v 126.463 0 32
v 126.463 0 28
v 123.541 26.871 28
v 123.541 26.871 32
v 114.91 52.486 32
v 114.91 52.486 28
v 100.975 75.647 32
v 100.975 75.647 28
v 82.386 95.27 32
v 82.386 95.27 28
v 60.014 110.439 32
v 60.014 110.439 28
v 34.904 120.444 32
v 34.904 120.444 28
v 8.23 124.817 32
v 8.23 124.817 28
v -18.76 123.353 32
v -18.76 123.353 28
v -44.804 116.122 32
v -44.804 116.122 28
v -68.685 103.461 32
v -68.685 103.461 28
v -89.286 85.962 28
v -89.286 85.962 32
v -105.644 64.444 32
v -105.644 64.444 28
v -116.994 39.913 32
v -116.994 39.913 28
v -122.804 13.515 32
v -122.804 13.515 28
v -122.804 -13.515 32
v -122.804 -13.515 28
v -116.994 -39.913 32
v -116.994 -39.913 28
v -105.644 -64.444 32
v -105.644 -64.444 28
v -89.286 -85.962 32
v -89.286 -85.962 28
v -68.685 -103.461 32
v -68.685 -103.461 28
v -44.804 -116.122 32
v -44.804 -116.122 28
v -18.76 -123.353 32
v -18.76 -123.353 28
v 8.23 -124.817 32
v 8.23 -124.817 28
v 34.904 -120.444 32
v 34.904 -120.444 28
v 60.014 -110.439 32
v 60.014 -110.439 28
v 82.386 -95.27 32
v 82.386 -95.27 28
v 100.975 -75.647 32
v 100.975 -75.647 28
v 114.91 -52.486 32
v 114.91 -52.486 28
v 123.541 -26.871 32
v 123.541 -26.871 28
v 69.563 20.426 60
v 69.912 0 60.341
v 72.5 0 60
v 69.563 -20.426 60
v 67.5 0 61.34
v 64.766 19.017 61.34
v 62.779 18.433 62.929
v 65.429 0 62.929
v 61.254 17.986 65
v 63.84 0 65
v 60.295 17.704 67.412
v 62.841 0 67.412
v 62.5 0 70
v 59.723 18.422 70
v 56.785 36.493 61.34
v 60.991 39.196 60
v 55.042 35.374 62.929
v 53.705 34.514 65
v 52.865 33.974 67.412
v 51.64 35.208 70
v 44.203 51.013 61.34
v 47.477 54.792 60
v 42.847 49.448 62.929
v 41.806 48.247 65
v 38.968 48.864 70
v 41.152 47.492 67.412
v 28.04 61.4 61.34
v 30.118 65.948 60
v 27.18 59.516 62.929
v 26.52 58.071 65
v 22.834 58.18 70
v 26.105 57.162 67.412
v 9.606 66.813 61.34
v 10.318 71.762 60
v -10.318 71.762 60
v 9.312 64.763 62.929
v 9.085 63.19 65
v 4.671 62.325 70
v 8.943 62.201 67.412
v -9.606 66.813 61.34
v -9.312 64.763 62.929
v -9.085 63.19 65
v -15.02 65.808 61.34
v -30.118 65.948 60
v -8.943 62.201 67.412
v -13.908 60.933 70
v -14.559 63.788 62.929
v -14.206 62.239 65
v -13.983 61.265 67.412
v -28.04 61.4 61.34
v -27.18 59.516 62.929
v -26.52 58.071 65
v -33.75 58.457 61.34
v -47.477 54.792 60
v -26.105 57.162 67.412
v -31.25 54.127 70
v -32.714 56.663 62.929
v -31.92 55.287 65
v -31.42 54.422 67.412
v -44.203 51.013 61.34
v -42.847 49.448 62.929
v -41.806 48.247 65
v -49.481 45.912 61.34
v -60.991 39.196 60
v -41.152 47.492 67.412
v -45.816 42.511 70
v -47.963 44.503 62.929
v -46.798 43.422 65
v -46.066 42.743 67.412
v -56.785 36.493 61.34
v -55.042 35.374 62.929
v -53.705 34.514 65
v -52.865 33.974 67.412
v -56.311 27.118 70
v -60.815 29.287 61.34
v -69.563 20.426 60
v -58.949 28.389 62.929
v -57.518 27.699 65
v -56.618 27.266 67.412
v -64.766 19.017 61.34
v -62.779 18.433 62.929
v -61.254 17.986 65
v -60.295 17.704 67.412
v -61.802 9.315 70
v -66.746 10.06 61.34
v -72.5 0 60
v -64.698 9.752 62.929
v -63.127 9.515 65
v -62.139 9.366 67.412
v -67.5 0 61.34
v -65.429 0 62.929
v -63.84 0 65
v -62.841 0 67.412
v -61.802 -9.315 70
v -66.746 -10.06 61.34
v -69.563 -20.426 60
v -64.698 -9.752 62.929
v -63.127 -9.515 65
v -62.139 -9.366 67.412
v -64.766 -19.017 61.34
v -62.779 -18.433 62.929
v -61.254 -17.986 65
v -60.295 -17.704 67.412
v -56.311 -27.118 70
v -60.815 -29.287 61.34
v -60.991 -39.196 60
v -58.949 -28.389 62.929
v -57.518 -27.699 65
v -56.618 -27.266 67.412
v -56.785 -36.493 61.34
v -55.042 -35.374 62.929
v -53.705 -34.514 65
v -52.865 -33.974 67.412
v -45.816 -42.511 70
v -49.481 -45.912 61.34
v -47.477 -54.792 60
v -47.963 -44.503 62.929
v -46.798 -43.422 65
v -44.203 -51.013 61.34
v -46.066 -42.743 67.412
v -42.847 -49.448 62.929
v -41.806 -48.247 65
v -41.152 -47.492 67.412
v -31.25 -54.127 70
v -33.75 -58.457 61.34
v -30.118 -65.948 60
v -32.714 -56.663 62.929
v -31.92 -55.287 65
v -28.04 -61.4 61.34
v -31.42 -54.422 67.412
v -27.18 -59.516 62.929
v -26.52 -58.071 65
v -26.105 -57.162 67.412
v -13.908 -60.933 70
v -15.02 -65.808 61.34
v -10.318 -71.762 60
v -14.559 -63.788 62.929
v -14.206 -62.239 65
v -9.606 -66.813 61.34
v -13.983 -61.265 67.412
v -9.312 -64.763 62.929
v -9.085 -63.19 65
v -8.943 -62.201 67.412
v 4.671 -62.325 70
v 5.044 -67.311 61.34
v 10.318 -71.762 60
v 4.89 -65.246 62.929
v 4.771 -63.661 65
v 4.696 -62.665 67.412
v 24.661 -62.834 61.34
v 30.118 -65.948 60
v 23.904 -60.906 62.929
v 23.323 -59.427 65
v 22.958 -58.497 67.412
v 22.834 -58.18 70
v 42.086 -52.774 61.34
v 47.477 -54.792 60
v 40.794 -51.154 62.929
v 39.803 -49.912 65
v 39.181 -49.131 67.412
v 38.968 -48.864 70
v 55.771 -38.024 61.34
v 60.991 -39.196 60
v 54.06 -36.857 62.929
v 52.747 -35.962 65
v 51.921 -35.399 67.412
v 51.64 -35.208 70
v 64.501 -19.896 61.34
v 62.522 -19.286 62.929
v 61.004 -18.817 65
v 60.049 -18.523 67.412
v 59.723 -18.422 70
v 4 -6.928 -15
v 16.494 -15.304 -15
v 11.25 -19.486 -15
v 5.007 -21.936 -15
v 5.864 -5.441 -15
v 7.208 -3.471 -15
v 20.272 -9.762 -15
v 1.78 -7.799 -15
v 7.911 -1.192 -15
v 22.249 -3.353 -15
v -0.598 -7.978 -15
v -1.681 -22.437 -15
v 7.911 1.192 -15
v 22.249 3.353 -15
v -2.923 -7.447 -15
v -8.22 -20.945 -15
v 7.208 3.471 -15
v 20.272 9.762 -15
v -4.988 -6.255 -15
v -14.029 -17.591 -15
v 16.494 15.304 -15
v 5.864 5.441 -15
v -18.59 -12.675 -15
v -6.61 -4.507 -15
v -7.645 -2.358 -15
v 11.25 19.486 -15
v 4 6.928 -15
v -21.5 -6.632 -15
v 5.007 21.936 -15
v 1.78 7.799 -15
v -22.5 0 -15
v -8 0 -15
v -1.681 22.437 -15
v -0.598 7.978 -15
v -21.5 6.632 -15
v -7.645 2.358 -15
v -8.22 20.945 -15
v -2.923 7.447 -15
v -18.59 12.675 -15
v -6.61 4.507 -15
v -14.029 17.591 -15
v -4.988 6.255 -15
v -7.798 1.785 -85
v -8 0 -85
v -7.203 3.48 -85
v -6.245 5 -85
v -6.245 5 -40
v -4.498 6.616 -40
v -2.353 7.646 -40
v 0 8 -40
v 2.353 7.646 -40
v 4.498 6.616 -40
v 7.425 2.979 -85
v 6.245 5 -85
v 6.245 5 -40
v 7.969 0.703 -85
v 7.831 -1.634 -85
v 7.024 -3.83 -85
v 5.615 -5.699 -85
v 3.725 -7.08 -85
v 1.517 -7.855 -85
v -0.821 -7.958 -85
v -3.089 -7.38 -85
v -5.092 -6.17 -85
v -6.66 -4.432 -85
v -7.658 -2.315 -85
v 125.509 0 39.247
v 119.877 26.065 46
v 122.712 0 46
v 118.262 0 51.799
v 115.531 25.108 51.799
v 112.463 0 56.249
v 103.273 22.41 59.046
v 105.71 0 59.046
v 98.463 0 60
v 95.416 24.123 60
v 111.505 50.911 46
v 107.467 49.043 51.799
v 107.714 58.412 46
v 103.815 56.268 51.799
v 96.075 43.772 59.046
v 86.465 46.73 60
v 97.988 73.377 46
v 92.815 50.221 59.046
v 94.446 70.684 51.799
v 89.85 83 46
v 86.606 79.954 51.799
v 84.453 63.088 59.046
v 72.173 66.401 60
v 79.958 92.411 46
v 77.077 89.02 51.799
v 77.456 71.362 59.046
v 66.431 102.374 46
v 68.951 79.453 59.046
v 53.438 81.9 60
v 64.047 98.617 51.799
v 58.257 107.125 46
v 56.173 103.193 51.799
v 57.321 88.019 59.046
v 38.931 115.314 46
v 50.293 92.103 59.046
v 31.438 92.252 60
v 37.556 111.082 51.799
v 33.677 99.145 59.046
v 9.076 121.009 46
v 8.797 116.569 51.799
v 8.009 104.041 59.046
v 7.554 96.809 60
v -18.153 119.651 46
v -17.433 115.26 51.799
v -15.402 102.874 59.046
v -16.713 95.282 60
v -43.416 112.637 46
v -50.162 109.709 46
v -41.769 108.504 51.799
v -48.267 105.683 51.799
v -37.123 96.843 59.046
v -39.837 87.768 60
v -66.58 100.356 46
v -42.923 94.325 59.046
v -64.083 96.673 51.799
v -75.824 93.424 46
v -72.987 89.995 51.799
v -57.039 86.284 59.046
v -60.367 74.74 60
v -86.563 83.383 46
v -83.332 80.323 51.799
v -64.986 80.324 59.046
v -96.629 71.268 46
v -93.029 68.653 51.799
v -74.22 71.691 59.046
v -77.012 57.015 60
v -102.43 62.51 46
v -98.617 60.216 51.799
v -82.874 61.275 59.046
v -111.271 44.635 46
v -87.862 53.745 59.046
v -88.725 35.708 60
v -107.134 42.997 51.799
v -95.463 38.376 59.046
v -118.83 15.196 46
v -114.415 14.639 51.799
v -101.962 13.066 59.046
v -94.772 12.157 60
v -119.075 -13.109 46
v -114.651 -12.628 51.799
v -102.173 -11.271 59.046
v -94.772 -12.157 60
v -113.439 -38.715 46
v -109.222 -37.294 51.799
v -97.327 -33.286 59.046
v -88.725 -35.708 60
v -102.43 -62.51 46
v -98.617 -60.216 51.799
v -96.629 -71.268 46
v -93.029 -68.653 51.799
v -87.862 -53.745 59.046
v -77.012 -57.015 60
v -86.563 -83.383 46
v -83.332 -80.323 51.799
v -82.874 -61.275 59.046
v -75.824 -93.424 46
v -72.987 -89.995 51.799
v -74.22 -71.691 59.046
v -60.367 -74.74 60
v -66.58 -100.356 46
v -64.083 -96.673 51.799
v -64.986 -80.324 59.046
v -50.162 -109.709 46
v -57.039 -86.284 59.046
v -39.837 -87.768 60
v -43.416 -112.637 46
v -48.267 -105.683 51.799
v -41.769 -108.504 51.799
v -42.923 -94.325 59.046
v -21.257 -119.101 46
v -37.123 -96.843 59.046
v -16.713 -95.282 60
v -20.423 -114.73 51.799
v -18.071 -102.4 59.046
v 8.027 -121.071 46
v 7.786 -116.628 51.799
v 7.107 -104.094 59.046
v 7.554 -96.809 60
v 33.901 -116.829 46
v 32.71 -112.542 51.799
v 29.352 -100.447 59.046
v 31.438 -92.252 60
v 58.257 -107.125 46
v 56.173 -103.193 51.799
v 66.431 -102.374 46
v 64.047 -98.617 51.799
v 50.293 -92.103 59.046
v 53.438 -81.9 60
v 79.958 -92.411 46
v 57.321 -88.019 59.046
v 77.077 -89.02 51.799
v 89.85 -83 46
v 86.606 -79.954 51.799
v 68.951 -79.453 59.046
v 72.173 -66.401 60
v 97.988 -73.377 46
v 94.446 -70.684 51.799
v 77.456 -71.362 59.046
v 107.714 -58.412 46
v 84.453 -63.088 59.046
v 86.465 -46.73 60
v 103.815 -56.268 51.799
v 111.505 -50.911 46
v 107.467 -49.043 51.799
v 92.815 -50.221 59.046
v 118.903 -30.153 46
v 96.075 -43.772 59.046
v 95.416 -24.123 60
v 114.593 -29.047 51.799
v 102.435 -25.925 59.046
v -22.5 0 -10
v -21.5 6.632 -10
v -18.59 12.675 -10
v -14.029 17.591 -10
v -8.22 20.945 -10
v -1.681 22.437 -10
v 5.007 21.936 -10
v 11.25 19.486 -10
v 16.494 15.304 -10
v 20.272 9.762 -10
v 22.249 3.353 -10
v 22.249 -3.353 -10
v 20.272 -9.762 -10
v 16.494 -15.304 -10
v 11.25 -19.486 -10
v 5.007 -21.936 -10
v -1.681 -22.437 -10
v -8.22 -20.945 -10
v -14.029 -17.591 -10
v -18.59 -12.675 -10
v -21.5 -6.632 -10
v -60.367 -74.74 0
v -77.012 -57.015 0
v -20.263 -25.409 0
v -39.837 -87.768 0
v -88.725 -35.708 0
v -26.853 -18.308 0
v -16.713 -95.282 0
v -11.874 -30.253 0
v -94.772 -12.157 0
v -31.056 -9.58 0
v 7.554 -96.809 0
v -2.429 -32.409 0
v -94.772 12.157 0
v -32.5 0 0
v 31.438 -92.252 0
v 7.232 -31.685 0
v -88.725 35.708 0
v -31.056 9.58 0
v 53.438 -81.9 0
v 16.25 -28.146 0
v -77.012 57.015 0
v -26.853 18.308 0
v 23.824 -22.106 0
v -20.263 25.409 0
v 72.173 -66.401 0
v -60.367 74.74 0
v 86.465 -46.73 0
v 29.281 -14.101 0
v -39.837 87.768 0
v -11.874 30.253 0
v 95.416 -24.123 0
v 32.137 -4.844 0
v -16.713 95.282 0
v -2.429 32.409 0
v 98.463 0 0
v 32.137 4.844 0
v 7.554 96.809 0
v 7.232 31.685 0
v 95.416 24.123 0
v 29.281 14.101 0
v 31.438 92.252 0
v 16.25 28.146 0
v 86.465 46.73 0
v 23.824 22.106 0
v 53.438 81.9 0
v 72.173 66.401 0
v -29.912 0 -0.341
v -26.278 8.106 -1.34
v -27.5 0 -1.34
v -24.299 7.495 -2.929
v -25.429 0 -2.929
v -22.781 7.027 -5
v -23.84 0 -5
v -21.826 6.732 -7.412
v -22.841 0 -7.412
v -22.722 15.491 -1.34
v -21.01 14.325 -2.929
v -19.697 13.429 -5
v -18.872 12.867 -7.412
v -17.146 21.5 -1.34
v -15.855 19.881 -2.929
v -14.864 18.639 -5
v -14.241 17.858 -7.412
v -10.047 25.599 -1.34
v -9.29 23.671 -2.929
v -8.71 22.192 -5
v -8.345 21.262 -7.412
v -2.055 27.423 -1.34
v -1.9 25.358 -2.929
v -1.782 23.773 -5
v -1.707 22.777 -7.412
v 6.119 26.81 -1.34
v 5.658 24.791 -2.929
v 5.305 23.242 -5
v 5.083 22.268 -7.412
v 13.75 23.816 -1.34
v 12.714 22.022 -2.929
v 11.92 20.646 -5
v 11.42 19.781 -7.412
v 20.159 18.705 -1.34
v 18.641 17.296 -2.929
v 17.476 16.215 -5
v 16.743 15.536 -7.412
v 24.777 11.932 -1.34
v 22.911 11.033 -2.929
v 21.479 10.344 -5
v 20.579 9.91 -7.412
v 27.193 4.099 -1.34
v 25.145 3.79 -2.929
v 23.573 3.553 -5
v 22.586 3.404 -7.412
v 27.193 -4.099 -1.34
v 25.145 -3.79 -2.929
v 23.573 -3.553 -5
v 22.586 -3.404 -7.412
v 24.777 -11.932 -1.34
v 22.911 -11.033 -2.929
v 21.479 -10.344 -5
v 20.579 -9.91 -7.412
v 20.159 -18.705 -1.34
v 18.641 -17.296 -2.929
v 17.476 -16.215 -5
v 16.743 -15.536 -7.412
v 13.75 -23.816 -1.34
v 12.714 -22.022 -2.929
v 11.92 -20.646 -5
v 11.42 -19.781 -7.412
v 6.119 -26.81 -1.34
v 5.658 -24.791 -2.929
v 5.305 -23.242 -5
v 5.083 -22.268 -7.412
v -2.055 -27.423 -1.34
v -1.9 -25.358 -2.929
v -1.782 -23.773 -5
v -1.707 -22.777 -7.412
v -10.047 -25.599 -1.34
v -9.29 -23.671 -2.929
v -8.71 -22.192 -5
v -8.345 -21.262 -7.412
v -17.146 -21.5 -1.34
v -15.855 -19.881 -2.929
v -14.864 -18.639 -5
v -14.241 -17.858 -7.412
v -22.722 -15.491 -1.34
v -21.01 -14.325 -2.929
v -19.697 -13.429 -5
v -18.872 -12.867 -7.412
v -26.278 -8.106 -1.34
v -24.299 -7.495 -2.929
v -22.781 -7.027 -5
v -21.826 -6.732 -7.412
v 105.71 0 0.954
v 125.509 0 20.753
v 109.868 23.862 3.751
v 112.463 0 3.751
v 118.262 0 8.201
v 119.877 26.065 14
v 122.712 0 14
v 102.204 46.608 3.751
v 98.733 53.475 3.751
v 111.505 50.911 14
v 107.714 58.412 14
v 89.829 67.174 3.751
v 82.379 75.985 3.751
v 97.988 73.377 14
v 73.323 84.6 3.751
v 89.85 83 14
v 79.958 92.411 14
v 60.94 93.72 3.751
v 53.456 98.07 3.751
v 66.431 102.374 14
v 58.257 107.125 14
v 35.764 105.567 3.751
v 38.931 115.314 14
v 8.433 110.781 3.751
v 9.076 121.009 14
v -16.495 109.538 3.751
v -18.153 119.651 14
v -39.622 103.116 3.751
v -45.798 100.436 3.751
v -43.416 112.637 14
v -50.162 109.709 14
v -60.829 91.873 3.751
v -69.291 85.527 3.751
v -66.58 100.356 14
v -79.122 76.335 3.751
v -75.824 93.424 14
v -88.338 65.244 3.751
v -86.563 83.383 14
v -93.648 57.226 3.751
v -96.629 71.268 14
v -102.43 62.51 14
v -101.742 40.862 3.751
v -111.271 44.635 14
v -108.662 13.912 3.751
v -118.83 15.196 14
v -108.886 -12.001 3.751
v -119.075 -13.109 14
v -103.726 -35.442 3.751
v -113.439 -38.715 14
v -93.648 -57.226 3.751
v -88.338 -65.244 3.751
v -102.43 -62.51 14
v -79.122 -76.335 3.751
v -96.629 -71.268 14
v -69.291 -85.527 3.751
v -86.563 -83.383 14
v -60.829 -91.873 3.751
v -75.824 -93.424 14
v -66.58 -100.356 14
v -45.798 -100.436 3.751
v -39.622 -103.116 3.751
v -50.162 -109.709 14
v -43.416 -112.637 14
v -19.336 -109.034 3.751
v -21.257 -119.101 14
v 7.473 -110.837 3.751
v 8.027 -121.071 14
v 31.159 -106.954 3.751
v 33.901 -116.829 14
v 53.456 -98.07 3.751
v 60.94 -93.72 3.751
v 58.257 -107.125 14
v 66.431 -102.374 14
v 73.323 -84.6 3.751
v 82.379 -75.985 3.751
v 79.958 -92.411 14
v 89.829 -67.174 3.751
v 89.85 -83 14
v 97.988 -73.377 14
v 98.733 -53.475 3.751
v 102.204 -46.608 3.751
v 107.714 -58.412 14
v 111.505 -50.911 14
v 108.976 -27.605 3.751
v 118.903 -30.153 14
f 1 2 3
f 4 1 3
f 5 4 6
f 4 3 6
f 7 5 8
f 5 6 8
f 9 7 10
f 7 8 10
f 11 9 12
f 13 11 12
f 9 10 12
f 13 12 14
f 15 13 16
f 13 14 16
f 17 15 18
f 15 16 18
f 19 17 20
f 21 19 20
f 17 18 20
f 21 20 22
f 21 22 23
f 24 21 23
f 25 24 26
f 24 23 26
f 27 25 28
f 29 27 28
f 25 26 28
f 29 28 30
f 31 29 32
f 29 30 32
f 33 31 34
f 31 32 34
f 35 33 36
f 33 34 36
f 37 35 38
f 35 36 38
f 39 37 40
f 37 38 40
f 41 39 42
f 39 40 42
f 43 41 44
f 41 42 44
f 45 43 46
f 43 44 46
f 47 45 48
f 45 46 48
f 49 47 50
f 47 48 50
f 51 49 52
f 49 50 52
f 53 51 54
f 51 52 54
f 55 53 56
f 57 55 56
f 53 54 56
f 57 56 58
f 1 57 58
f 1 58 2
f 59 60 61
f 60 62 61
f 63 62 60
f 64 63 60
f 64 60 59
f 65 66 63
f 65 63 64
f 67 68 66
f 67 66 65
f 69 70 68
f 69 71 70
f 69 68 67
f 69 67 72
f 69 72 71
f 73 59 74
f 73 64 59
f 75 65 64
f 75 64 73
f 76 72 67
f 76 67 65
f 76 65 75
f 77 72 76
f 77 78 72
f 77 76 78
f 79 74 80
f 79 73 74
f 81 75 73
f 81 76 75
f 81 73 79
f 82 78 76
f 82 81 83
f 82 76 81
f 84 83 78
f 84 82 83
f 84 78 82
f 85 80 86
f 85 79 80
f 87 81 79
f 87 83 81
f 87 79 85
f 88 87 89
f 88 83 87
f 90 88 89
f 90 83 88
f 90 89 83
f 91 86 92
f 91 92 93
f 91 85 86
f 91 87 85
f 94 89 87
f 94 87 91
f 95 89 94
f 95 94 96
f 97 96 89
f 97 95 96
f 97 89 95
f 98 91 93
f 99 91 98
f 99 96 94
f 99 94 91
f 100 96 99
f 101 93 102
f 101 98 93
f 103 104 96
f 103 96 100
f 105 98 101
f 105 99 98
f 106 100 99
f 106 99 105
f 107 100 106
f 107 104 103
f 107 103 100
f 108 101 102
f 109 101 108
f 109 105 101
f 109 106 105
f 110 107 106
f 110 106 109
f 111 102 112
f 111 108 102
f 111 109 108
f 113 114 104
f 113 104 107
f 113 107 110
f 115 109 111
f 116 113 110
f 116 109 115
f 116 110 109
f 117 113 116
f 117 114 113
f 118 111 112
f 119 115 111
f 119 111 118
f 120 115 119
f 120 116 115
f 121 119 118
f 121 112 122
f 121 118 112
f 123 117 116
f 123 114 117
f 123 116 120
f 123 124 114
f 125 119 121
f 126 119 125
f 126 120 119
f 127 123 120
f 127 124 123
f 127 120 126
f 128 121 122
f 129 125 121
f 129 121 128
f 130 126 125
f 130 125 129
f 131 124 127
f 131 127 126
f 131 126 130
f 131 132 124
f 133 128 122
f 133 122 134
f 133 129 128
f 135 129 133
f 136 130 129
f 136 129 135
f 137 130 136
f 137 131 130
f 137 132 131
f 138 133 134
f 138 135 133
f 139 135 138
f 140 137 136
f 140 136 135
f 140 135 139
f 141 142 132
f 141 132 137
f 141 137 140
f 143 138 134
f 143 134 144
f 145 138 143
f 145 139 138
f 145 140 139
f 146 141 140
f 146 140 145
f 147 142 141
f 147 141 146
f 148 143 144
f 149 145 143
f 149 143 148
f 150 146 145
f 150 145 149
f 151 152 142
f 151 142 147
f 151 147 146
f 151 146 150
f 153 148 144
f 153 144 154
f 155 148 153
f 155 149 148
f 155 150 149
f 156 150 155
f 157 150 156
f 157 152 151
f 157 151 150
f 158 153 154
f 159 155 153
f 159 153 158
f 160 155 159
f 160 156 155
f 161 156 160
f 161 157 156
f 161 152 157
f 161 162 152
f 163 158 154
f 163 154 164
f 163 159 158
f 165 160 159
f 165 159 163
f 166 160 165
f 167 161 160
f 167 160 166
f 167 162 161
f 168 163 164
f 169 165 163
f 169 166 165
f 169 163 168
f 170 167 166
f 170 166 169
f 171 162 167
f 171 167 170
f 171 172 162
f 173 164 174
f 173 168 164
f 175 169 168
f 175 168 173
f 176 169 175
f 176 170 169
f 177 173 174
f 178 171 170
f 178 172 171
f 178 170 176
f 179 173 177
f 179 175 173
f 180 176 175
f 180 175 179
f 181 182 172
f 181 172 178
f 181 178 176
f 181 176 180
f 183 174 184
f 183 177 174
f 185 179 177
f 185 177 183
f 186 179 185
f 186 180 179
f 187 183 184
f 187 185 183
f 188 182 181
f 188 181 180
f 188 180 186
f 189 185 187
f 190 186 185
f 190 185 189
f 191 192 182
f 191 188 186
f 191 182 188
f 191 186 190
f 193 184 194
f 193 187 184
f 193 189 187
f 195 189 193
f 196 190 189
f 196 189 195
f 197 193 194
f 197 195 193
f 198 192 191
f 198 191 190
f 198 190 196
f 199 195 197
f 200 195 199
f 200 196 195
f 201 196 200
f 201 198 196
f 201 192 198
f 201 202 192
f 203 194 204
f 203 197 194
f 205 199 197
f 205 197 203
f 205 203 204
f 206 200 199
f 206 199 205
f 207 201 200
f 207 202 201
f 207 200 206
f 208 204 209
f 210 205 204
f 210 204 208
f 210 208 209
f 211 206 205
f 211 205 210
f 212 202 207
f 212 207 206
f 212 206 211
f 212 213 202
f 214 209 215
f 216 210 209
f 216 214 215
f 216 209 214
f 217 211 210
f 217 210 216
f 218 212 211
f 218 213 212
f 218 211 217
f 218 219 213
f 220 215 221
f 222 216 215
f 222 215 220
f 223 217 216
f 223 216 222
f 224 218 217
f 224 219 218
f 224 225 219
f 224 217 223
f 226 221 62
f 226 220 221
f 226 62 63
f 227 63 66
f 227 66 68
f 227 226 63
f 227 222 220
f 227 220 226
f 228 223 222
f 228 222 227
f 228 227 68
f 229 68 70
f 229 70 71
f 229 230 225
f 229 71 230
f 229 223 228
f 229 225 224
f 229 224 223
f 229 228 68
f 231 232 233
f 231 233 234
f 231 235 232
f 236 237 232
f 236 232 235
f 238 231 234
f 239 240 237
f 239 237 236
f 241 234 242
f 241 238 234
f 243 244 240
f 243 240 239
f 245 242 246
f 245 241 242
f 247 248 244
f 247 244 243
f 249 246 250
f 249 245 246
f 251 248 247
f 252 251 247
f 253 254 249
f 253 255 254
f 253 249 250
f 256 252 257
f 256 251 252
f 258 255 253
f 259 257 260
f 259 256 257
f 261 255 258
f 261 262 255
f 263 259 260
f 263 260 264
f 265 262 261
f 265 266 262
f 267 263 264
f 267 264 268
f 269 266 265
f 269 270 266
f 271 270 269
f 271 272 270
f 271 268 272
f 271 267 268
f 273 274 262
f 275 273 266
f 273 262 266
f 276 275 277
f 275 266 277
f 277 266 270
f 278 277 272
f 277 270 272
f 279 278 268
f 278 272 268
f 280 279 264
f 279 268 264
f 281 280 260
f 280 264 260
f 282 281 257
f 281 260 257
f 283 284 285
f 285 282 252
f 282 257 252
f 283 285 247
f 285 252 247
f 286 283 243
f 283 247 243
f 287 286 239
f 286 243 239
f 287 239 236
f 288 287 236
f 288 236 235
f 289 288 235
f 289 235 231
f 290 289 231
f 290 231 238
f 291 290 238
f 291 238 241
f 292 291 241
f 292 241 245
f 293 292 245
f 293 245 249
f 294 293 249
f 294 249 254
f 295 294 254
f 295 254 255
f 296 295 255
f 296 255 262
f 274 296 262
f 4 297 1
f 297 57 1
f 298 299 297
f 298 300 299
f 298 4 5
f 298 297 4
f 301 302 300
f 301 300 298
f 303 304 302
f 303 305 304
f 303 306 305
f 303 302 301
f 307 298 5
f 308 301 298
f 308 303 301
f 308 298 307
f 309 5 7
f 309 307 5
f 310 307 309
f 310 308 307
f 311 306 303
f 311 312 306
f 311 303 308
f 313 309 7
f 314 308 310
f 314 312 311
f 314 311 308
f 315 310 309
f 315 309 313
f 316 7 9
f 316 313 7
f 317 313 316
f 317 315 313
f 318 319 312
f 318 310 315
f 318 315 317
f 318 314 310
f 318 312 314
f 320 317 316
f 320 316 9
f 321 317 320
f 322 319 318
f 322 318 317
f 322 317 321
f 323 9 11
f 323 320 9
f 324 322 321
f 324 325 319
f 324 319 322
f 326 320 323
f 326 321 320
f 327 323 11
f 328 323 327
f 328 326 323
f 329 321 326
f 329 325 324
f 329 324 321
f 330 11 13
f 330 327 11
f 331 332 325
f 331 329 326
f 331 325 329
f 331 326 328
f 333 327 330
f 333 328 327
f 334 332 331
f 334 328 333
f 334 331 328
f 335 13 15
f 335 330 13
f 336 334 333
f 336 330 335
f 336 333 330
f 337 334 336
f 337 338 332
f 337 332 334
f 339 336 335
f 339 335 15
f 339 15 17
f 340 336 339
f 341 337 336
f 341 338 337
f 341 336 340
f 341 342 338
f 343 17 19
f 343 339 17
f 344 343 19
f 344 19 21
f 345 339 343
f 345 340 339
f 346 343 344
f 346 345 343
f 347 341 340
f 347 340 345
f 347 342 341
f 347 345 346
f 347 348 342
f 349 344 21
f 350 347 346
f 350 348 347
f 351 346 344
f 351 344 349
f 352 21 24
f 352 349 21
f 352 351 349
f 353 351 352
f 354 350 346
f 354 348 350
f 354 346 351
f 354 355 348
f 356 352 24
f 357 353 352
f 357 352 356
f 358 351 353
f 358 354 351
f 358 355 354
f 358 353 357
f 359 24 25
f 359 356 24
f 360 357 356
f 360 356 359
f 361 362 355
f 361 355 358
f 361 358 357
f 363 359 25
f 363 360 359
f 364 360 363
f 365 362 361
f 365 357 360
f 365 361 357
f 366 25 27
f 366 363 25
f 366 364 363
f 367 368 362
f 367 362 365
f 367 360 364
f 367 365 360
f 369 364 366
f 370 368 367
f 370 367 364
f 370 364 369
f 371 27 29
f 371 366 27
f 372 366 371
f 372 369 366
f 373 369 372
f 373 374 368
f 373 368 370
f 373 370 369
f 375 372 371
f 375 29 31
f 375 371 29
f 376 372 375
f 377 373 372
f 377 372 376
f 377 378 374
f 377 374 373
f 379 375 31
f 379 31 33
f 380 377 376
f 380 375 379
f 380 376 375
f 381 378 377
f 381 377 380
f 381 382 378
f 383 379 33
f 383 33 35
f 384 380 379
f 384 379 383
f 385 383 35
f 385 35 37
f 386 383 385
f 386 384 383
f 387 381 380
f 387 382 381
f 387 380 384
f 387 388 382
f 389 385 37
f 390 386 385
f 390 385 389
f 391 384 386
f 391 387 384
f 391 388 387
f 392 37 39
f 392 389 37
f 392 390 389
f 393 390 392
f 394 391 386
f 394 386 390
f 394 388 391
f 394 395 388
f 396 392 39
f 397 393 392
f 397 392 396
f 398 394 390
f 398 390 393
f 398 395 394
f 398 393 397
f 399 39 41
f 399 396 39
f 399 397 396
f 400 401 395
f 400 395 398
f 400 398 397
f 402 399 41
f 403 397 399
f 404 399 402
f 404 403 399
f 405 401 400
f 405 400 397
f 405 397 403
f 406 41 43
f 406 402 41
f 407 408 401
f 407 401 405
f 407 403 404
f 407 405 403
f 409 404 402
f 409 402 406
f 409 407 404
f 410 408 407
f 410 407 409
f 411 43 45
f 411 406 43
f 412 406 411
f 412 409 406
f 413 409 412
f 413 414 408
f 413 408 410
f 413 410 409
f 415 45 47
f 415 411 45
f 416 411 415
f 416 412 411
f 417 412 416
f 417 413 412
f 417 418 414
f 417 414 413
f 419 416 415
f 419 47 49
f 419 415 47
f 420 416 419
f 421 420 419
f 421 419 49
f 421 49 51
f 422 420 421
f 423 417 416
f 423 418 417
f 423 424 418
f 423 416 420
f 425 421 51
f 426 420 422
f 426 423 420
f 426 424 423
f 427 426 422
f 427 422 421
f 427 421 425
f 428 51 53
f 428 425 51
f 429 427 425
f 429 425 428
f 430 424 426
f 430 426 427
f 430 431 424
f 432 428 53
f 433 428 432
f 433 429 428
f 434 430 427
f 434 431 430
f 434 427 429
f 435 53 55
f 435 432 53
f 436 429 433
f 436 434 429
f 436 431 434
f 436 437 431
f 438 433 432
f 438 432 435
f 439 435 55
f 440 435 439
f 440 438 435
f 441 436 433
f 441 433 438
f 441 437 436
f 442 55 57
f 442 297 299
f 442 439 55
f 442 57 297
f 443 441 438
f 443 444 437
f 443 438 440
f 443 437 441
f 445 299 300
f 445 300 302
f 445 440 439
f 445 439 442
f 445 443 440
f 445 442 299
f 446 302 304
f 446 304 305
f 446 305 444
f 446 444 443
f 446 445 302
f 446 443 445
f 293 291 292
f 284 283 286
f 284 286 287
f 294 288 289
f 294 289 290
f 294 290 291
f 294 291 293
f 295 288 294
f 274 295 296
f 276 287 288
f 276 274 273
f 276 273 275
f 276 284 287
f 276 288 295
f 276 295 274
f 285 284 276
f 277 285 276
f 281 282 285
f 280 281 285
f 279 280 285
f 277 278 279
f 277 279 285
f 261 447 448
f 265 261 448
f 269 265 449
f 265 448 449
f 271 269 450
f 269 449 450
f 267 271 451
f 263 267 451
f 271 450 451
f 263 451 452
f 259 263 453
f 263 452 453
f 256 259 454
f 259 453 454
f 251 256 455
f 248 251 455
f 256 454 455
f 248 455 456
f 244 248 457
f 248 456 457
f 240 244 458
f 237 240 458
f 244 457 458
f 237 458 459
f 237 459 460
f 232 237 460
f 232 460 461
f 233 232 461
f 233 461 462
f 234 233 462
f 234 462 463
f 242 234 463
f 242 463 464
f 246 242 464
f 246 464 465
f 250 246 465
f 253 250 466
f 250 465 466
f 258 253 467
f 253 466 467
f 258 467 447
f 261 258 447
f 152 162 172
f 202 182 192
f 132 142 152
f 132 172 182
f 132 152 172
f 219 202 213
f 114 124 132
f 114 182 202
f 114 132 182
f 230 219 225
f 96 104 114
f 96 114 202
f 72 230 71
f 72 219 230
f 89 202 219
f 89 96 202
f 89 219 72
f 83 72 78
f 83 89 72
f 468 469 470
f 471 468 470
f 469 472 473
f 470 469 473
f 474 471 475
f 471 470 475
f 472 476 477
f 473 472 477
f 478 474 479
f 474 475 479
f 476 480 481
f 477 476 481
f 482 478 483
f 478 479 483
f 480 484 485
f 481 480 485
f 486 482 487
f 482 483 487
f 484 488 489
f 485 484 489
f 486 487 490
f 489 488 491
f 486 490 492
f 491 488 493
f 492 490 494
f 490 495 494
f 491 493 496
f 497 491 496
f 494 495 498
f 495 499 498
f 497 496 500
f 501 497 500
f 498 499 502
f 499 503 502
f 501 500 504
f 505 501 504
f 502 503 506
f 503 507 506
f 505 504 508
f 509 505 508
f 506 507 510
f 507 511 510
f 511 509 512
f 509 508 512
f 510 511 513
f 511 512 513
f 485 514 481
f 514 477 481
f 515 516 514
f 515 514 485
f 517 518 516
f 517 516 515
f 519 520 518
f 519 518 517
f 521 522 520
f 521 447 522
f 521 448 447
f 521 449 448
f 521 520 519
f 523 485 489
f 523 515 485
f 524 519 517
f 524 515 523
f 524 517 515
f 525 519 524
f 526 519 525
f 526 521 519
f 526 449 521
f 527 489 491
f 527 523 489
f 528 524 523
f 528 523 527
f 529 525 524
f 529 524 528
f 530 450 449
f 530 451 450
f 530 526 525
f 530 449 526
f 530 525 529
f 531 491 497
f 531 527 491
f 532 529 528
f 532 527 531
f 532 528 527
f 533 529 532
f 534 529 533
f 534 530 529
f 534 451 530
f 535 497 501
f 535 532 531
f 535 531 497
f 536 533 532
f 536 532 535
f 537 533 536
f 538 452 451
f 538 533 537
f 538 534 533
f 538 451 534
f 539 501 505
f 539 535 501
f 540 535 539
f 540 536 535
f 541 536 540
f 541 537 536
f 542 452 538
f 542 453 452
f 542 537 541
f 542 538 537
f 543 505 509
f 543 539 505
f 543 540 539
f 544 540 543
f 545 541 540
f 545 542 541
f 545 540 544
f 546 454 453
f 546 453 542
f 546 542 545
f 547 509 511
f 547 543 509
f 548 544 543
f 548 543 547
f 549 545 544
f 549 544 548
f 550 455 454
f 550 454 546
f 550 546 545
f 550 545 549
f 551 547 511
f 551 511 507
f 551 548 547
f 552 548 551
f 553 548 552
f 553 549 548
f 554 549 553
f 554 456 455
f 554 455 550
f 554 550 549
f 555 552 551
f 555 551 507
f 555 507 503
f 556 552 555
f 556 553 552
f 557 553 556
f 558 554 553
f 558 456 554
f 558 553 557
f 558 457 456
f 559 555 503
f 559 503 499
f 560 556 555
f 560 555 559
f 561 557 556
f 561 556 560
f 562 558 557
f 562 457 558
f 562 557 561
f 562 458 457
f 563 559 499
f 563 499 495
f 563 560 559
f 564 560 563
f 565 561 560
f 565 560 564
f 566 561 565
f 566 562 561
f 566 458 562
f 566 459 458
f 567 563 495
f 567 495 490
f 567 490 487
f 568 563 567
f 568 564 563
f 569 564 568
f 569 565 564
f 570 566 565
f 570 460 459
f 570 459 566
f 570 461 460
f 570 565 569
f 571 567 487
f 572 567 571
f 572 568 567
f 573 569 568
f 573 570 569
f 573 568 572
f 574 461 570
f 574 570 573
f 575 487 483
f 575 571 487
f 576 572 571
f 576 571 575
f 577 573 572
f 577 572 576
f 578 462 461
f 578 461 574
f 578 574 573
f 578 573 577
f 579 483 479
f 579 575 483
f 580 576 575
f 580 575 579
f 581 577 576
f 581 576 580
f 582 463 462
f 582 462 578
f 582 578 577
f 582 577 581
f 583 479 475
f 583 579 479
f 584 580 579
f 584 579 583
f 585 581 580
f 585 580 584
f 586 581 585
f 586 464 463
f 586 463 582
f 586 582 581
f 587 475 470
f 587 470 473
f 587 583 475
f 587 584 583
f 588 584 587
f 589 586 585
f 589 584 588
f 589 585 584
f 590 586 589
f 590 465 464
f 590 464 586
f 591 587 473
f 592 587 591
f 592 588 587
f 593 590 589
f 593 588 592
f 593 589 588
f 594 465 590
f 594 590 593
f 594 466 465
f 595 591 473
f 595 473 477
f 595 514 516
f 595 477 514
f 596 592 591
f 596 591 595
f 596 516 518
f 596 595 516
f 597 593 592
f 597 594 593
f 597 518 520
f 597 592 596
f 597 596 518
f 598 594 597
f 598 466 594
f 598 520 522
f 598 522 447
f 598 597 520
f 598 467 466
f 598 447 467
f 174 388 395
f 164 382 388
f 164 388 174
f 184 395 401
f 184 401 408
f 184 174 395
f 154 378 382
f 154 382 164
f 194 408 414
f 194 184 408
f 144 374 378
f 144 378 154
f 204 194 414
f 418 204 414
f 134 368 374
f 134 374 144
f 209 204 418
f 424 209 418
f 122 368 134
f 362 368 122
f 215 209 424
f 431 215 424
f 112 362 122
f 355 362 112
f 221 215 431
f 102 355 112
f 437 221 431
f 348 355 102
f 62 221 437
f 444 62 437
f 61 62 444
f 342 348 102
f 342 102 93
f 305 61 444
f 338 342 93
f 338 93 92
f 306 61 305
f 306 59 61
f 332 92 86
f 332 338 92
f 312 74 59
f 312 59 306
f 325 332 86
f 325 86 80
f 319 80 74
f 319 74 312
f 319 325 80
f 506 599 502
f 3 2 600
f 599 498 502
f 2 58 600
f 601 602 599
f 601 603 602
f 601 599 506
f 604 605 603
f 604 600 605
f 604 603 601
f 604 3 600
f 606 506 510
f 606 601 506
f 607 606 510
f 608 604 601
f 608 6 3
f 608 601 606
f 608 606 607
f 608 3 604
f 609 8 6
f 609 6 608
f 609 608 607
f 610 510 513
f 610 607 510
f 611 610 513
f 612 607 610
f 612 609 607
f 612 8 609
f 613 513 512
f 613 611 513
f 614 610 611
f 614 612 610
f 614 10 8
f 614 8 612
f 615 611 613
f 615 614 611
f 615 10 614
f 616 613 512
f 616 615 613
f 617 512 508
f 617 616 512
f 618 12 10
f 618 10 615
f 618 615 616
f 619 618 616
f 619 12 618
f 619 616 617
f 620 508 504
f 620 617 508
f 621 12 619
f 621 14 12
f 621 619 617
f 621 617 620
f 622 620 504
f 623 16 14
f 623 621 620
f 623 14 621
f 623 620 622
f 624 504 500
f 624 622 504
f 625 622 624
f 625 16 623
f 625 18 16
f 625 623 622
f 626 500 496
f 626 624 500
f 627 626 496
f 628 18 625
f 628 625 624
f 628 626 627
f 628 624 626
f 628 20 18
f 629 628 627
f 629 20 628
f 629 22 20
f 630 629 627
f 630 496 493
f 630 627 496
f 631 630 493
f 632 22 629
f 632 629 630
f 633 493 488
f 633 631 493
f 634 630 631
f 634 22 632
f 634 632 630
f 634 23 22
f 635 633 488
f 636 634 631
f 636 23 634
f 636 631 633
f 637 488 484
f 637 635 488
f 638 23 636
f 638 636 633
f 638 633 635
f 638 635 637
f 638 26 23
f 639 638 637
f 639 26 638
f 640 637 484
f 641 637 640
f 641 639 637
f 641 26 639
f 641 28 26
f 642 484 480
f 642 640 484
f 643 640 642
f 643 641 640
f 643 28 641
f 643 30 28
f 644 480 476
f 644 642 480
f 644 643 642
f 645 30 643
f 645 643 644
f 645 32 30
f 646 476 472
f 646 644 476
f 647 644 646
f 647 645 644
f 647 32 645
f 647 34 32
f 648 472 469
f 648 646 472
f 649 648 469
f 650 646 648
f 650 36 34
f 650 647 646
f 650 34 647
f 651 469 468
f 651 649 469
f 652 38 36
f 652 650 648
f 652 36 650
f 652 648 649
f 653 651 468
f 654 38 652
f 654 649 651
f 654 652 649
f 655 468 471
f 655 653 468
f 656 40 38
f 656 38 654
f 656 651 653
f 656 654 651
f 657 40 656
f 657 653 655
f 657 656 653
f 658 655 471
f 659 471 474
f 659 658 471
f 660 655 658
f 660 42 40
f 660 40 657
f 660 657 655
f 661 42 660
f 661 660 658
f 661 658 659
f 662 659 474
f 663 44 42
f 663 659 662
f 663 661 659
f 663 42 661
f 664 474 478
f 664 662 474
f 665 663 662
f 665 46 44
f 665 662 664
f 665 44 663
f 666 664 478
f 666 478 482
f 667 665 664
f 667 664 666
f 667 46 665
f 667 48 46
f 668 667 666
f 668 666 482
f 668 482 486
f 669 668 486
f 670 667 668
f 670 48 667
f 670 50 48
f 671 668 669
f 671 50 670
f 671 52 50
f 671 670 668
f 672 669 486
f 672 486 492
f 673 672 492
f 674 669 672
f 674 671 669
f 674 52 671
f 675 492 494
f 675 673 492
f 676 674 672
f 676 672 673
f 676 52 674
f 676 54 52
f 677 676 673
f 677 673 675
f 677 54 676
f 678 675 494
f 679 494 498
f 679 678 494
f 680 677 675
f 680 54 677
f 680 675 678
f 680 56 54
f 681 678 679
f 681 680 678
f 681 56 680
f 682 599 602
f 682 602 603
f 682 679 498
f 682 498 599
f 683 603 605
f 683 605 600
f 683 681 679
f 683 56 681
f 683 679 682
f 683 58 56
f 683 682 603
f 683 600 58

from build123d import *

# Parameters (mm, degrees)
SCHIZZO1_R                    = 125
ESTRUSIONE_ESTRUSIONE1_DEPTH  = 60
SCHIZZO2_R                    = 62.5
ESTRUSIONE_ESTRUSIONE2_DEPTH  = 10
SCHIZZO3_R                    = 22.5
ESTRUSIONE_ESTRUSIONE3_DEPTH  = 15
SCHIZZO4_R                    = 8
ESTRUSIONE_ESTRUSIONE4_DEPTH  = 70
RACCORDO1_R                   = 10
RACCORDO2_R                   = 28
TAGLIO_ESTRUSIONE1_DEPTH      = 236.887520145
TAGLIO_ESTRUSIONE1_DEPTH_BACK = 45


with BuildPart() as part:
    # Schizzo1 → Estrusione-Estrusione1 (new body)
    with BuildSketch(Plane.XY):
        with Locations((1.463125693, 0)):
            Circle(SCHIZZO1_R)
    extrude(amount=ESTRUSIONE_ESTRUSIONE1_DEPTH)

    # Schizzo2 → Estrusione-Estrusione2 (add)
    with BuildSketch(Plane.XY.offset(60)):
        Circle(SCHIZZO2_R)
    extrude(amount=ESTRUSIONE_ESTRUSIONE2_DEPTH)

    # Schizzo3 → Estrusione-Estrusione3 (add)
    with BuildSketch(Plane(origin=(0, 0, 0), x_dir=(-1, 0, 0), z_dir=(0, 0, -1))):
        Circle(SCHIZZO3_R)
    extrude(amount=ESTRUSIONE_ESTRUSIONE3_DEPTH)

    # Schizzo4 → Estrusione-Estrusione4 (add)
    with BuildSketch(Plane(origin=(0, 0, -15), x_dir=(-1, 0, 0), z_dir=(0, 0, -1))):
        Circle(SCHIZZO4_R)
    extrude(amount=ESTRUSIONE_ESTRUSIONE4_DEPTH)

    # Raccordo1
    raccordo1_edges = [part.edges().sort_by_distance(p)[0] for p in [
        (-62.5, 0, 60),
        (22.5, 0, 0),
    ]]
    fillet(raccordo1_edges, radius=RACCORDO1_R - 0.0001)  # a hair under: the kernel refuses the full size

    # Raccordo2
    raccordo2_edges = [part.edges().sort_by_distance(p)[0] for p in [
        (-123.536874307, 0, 0),
        (-123.536874307, 0, 60),
    ]]
    fillet(raccordo2_edges, radius=RACCORDO2_R)

    # Schizzo5 → Taglio-Estrusione1 (cut, two sides: drawn at the far end of the back side and taken through both)
    with BuildSketch(Plane(origin=(0, 0, -85), x_dir=(-1, 0, 0), z_dir=(0, 0, -1)).offset(-TAGLIO_ESTRUSIONE1_DEPTH_BACK)):
        Polygon((-387.790129005, 5), (-6.244997998, 5), (6.244997998, 5), (387.790129005, 5), (387.790129005, 768.090262014), (-387.790129005, 768.090262014), align=None)
    extrude(amount=TAGLIO_ESTRUSIONE1_DEPTH + TAGLIO_ESTRUSIONE1_DEPTH_BACK, mode=Mode.SUBTRACT)


solid = part.part
